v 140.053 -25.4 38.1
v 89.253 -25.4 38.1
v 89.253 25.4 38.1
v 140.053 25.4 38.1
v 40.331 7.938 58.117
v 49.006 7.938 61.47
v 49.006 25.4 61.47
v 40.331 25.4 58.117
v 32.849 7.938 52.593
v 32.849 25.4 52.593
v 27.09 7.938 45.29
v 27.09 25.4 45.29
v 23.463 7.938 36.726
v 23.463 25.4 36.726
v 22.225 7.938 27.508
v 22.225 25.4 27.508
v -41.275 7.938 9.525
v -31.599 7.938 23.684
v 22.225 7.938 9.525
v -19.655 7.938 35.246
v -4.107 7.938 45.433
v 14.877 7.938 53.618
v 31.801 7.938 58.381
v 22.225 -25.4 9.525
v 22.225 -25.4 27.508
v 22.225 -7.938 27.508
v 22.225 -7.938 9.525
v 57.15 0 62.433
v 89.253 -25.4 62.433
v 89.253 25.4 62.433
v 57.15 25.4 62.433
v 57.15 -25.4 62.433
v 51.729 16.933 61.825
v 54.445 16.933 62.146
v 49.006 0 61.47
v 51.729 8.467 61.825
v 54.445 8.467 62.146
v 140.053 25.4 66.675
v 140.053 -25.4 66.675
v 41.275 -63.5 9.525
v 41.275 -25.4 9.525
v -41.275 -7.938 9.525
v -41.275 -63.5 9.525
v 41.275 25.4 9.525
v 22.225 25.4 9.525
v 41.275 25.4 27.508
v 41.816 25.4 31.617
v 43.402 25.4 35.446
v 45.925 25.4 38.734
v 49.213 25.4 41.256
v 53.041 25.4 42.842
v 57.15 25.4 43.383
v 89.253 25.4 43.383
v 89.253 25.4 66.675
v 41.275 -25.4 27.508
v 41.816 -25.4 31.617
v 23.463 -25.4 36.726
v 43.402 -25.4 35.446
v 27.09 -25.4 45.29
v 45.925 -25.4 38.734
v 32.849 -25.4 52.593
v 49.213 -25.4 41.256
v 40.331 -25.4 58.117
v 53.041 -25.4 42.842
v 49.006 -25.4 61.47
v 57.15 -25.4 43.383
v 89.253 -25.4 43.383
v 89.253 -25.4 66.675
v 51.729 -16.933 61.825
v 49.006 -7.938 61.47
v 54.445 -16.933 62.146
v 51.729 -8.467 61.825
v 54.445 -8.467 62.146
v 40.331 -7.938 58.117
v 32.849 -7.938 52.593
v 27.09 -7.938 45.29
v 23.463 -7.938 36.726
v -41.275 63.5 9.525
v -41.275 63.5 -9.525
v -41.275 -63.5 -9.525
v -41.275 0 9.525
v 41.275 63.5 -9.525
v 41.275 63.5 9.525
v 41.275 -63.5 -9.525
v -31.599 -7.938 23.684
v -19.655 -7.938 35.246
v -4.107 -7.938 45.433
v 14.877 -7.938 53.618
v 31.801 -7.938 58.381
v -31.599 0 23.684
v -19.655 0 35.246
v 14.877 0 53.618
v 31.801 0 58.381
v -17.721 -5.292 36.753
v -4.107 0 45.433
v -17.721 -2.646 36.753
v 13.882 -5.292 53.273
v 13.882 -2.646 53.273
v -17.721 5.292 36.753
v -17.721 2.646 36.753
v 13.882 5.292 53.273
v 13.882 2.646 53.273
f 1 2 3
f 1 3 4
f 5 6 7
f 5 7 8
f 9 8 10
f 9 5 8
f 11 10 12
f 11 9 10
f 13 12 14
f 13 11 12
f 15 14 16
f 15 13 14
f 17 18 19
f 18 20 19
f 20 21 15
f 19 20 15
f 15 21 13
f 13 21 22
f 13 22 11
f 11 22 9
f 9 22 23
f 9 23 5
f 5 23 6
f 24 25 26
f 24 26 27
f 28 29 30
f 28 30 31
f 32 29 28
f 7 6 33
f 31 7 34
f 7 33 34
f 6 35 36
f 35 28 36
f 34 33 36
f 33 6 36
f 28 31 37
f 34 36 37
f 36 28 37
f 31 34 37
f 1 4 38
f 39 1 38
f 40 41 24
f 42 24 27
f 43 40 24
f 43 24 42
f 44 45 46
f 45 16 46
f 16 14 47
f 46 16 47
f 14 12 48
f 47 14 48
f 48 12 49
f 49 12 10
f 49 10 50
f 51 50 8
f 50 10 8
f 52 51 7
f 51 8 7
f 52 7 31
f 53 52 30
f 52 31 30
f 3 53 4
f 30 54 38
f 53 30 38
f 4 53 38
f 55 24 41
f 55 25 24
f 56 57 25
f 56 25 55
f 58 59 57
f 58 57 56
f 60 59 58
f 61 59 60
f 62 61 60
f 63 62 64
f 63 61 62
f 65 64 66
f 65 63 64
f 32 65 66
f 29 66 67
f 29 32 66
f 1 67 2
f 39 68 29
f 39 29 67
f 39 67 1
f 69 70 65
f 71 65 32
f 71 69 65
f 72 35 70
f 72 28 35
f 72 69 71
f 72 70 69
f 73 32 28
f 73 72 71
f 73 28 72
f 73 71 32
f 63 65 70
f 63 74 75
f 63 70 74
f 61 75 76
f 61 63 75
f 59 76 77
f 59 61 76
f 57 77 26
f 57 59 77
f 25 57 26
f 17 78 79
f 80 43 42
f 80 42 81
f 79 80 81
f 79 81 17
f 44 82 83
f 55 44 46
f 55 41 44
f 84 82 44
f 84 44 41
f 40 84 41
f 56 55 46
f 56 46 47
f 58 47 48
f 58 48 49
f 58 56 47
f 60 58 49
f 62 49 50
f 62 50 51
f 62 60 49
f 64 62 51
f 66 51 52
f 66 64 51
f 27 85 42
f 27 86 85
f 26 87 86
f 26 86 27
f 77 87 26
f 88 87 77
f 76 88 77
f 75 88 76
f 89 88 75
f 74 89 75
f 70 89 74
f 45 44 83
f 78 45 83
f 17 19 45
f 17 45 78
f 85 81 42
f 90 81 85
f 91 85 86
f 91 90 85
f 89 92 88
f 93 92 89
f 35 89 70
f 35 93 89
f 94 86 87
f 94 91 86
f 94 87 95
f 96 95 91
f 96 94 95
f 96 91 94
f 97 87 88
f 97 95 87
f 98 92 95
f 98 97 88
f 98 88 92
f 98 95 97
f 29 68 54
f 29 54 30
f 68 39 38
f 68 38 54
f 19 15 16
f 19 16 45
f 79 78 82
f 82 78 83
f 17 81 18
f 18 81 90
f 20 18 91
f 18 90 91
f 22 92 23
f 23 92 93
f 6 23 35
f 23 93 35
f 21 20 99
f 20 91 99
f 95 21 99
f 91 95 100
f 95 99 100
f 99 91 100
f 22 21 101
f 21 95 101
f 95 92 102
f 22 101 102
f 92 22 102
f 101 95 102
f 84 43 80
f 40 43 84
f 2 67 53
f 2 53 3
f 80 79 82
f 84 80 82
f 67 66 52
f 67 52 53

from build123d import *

# Parameters (mm, degrees)
F1_DEPTH = 63.5
F2_DEPTH = 25.4
F3_DEPTH = 7.9375


with BuildPart() as f1:
    # F0 (on Front) → F1 (new body, symmetric)
    with BuildSketch(Plane.XZ):
        Polygon((41.275, -9.525), (41.275, 9.525), (22.225, 9.525), (-41.275, 9.525), (-41.275, -9.525), align=None)
    extrude(amount=F1_DEPTH, both=True)

    # F0 (on Front) → F2 (join, symmetric)
    with BuildSketch(Plane.XZ):
        with BuildLine():
            Line((22.225, 9.525), (41.275, 9.525))
            Line((41.275, 9.525), (41.275, 27.5082))
            ThreePointArc((41.275, 27.5082), (45.9246798487, 38.7335201513), (57.15, 43.3832))
            Line((57.15, 43.3832), (85.725, 43.3832))
            Line((85.725, 43.3832), (89.2527830116, 43.3832))
            Line((89.2527830116, 43.3832), (89.2527830116, 62.4332))
            Line((89.2527830116, 62.4332), (57.15, 62.4332))
            add(Edge.make_bspline(
                [(49.0060559651, 61.4704113614), (51.7327824765, 61.8426488298), (54.4505405881, 62.1619414816), (57.15, 62.4332)],
                knots=[103.7473842529, 103.7473842529, 103.7473842529, 103.7473842529, 111.7441642872, 111.7441642872, 111.7441642872, 111.7441642872], degree=3))
            ThreePointArc((49.0060559651, 61.4704113614), (29.7257144996, 49.1337448438), (22.225, 27.5082))
            Line((22.225, 27.5082), (22.225, 9.525))
        make_face()
        Polygon((89.2527830116, 66.675), (89.2527830116, 62.4332), (113.3148976126, 62.4332), (114.1855414441, 43.3832), (114.427, 38.1), (140.0527830116, 38.1), (140.0527830116, 66.675), align=None)
        Polygon((89.2527830116, 62.4332), (89.2527830116, 43.3832), (114.1855414441, 43.3832), (113.3148976126, 62.4332), align=None)
        Polygon((114.1855414441, 43.3832), (89.2527830116, 43.3832), (89.2527830116, 38.1), (114.427, 38.1), align=None)
    extrude(amount=F2_DEPTH, both=True)

    # F0 (on Front) → F3 (join, symmetric)
    with BuildSketch(Plane.XZ):
        with BuildLine():
            Line((-41.275, 9.525), (22.225, 9.525))
            Line((22.225, 9.525), (22.225, 27.5082))
            ThreePointArc((22.225, 27.5082), (29.7257144996, 49.1337448438), (49.0060559651, 61.4704113614))
            add(Edge.make_bspline(
                [(-41.275, 9.525), (-23.2546272246, 42.9004266833), (13.6304745526, 56.6411346395), (49.0060559651, 61.4704113614)],
                knots=[0, 0, 0, 0, 103.7473842529, 103.7473842529, 103.7473842529, 103.7473842529], degree=3))
        make_face()
    extrude(amount=F3_DEPTH, both=True)


solid = f1.part
